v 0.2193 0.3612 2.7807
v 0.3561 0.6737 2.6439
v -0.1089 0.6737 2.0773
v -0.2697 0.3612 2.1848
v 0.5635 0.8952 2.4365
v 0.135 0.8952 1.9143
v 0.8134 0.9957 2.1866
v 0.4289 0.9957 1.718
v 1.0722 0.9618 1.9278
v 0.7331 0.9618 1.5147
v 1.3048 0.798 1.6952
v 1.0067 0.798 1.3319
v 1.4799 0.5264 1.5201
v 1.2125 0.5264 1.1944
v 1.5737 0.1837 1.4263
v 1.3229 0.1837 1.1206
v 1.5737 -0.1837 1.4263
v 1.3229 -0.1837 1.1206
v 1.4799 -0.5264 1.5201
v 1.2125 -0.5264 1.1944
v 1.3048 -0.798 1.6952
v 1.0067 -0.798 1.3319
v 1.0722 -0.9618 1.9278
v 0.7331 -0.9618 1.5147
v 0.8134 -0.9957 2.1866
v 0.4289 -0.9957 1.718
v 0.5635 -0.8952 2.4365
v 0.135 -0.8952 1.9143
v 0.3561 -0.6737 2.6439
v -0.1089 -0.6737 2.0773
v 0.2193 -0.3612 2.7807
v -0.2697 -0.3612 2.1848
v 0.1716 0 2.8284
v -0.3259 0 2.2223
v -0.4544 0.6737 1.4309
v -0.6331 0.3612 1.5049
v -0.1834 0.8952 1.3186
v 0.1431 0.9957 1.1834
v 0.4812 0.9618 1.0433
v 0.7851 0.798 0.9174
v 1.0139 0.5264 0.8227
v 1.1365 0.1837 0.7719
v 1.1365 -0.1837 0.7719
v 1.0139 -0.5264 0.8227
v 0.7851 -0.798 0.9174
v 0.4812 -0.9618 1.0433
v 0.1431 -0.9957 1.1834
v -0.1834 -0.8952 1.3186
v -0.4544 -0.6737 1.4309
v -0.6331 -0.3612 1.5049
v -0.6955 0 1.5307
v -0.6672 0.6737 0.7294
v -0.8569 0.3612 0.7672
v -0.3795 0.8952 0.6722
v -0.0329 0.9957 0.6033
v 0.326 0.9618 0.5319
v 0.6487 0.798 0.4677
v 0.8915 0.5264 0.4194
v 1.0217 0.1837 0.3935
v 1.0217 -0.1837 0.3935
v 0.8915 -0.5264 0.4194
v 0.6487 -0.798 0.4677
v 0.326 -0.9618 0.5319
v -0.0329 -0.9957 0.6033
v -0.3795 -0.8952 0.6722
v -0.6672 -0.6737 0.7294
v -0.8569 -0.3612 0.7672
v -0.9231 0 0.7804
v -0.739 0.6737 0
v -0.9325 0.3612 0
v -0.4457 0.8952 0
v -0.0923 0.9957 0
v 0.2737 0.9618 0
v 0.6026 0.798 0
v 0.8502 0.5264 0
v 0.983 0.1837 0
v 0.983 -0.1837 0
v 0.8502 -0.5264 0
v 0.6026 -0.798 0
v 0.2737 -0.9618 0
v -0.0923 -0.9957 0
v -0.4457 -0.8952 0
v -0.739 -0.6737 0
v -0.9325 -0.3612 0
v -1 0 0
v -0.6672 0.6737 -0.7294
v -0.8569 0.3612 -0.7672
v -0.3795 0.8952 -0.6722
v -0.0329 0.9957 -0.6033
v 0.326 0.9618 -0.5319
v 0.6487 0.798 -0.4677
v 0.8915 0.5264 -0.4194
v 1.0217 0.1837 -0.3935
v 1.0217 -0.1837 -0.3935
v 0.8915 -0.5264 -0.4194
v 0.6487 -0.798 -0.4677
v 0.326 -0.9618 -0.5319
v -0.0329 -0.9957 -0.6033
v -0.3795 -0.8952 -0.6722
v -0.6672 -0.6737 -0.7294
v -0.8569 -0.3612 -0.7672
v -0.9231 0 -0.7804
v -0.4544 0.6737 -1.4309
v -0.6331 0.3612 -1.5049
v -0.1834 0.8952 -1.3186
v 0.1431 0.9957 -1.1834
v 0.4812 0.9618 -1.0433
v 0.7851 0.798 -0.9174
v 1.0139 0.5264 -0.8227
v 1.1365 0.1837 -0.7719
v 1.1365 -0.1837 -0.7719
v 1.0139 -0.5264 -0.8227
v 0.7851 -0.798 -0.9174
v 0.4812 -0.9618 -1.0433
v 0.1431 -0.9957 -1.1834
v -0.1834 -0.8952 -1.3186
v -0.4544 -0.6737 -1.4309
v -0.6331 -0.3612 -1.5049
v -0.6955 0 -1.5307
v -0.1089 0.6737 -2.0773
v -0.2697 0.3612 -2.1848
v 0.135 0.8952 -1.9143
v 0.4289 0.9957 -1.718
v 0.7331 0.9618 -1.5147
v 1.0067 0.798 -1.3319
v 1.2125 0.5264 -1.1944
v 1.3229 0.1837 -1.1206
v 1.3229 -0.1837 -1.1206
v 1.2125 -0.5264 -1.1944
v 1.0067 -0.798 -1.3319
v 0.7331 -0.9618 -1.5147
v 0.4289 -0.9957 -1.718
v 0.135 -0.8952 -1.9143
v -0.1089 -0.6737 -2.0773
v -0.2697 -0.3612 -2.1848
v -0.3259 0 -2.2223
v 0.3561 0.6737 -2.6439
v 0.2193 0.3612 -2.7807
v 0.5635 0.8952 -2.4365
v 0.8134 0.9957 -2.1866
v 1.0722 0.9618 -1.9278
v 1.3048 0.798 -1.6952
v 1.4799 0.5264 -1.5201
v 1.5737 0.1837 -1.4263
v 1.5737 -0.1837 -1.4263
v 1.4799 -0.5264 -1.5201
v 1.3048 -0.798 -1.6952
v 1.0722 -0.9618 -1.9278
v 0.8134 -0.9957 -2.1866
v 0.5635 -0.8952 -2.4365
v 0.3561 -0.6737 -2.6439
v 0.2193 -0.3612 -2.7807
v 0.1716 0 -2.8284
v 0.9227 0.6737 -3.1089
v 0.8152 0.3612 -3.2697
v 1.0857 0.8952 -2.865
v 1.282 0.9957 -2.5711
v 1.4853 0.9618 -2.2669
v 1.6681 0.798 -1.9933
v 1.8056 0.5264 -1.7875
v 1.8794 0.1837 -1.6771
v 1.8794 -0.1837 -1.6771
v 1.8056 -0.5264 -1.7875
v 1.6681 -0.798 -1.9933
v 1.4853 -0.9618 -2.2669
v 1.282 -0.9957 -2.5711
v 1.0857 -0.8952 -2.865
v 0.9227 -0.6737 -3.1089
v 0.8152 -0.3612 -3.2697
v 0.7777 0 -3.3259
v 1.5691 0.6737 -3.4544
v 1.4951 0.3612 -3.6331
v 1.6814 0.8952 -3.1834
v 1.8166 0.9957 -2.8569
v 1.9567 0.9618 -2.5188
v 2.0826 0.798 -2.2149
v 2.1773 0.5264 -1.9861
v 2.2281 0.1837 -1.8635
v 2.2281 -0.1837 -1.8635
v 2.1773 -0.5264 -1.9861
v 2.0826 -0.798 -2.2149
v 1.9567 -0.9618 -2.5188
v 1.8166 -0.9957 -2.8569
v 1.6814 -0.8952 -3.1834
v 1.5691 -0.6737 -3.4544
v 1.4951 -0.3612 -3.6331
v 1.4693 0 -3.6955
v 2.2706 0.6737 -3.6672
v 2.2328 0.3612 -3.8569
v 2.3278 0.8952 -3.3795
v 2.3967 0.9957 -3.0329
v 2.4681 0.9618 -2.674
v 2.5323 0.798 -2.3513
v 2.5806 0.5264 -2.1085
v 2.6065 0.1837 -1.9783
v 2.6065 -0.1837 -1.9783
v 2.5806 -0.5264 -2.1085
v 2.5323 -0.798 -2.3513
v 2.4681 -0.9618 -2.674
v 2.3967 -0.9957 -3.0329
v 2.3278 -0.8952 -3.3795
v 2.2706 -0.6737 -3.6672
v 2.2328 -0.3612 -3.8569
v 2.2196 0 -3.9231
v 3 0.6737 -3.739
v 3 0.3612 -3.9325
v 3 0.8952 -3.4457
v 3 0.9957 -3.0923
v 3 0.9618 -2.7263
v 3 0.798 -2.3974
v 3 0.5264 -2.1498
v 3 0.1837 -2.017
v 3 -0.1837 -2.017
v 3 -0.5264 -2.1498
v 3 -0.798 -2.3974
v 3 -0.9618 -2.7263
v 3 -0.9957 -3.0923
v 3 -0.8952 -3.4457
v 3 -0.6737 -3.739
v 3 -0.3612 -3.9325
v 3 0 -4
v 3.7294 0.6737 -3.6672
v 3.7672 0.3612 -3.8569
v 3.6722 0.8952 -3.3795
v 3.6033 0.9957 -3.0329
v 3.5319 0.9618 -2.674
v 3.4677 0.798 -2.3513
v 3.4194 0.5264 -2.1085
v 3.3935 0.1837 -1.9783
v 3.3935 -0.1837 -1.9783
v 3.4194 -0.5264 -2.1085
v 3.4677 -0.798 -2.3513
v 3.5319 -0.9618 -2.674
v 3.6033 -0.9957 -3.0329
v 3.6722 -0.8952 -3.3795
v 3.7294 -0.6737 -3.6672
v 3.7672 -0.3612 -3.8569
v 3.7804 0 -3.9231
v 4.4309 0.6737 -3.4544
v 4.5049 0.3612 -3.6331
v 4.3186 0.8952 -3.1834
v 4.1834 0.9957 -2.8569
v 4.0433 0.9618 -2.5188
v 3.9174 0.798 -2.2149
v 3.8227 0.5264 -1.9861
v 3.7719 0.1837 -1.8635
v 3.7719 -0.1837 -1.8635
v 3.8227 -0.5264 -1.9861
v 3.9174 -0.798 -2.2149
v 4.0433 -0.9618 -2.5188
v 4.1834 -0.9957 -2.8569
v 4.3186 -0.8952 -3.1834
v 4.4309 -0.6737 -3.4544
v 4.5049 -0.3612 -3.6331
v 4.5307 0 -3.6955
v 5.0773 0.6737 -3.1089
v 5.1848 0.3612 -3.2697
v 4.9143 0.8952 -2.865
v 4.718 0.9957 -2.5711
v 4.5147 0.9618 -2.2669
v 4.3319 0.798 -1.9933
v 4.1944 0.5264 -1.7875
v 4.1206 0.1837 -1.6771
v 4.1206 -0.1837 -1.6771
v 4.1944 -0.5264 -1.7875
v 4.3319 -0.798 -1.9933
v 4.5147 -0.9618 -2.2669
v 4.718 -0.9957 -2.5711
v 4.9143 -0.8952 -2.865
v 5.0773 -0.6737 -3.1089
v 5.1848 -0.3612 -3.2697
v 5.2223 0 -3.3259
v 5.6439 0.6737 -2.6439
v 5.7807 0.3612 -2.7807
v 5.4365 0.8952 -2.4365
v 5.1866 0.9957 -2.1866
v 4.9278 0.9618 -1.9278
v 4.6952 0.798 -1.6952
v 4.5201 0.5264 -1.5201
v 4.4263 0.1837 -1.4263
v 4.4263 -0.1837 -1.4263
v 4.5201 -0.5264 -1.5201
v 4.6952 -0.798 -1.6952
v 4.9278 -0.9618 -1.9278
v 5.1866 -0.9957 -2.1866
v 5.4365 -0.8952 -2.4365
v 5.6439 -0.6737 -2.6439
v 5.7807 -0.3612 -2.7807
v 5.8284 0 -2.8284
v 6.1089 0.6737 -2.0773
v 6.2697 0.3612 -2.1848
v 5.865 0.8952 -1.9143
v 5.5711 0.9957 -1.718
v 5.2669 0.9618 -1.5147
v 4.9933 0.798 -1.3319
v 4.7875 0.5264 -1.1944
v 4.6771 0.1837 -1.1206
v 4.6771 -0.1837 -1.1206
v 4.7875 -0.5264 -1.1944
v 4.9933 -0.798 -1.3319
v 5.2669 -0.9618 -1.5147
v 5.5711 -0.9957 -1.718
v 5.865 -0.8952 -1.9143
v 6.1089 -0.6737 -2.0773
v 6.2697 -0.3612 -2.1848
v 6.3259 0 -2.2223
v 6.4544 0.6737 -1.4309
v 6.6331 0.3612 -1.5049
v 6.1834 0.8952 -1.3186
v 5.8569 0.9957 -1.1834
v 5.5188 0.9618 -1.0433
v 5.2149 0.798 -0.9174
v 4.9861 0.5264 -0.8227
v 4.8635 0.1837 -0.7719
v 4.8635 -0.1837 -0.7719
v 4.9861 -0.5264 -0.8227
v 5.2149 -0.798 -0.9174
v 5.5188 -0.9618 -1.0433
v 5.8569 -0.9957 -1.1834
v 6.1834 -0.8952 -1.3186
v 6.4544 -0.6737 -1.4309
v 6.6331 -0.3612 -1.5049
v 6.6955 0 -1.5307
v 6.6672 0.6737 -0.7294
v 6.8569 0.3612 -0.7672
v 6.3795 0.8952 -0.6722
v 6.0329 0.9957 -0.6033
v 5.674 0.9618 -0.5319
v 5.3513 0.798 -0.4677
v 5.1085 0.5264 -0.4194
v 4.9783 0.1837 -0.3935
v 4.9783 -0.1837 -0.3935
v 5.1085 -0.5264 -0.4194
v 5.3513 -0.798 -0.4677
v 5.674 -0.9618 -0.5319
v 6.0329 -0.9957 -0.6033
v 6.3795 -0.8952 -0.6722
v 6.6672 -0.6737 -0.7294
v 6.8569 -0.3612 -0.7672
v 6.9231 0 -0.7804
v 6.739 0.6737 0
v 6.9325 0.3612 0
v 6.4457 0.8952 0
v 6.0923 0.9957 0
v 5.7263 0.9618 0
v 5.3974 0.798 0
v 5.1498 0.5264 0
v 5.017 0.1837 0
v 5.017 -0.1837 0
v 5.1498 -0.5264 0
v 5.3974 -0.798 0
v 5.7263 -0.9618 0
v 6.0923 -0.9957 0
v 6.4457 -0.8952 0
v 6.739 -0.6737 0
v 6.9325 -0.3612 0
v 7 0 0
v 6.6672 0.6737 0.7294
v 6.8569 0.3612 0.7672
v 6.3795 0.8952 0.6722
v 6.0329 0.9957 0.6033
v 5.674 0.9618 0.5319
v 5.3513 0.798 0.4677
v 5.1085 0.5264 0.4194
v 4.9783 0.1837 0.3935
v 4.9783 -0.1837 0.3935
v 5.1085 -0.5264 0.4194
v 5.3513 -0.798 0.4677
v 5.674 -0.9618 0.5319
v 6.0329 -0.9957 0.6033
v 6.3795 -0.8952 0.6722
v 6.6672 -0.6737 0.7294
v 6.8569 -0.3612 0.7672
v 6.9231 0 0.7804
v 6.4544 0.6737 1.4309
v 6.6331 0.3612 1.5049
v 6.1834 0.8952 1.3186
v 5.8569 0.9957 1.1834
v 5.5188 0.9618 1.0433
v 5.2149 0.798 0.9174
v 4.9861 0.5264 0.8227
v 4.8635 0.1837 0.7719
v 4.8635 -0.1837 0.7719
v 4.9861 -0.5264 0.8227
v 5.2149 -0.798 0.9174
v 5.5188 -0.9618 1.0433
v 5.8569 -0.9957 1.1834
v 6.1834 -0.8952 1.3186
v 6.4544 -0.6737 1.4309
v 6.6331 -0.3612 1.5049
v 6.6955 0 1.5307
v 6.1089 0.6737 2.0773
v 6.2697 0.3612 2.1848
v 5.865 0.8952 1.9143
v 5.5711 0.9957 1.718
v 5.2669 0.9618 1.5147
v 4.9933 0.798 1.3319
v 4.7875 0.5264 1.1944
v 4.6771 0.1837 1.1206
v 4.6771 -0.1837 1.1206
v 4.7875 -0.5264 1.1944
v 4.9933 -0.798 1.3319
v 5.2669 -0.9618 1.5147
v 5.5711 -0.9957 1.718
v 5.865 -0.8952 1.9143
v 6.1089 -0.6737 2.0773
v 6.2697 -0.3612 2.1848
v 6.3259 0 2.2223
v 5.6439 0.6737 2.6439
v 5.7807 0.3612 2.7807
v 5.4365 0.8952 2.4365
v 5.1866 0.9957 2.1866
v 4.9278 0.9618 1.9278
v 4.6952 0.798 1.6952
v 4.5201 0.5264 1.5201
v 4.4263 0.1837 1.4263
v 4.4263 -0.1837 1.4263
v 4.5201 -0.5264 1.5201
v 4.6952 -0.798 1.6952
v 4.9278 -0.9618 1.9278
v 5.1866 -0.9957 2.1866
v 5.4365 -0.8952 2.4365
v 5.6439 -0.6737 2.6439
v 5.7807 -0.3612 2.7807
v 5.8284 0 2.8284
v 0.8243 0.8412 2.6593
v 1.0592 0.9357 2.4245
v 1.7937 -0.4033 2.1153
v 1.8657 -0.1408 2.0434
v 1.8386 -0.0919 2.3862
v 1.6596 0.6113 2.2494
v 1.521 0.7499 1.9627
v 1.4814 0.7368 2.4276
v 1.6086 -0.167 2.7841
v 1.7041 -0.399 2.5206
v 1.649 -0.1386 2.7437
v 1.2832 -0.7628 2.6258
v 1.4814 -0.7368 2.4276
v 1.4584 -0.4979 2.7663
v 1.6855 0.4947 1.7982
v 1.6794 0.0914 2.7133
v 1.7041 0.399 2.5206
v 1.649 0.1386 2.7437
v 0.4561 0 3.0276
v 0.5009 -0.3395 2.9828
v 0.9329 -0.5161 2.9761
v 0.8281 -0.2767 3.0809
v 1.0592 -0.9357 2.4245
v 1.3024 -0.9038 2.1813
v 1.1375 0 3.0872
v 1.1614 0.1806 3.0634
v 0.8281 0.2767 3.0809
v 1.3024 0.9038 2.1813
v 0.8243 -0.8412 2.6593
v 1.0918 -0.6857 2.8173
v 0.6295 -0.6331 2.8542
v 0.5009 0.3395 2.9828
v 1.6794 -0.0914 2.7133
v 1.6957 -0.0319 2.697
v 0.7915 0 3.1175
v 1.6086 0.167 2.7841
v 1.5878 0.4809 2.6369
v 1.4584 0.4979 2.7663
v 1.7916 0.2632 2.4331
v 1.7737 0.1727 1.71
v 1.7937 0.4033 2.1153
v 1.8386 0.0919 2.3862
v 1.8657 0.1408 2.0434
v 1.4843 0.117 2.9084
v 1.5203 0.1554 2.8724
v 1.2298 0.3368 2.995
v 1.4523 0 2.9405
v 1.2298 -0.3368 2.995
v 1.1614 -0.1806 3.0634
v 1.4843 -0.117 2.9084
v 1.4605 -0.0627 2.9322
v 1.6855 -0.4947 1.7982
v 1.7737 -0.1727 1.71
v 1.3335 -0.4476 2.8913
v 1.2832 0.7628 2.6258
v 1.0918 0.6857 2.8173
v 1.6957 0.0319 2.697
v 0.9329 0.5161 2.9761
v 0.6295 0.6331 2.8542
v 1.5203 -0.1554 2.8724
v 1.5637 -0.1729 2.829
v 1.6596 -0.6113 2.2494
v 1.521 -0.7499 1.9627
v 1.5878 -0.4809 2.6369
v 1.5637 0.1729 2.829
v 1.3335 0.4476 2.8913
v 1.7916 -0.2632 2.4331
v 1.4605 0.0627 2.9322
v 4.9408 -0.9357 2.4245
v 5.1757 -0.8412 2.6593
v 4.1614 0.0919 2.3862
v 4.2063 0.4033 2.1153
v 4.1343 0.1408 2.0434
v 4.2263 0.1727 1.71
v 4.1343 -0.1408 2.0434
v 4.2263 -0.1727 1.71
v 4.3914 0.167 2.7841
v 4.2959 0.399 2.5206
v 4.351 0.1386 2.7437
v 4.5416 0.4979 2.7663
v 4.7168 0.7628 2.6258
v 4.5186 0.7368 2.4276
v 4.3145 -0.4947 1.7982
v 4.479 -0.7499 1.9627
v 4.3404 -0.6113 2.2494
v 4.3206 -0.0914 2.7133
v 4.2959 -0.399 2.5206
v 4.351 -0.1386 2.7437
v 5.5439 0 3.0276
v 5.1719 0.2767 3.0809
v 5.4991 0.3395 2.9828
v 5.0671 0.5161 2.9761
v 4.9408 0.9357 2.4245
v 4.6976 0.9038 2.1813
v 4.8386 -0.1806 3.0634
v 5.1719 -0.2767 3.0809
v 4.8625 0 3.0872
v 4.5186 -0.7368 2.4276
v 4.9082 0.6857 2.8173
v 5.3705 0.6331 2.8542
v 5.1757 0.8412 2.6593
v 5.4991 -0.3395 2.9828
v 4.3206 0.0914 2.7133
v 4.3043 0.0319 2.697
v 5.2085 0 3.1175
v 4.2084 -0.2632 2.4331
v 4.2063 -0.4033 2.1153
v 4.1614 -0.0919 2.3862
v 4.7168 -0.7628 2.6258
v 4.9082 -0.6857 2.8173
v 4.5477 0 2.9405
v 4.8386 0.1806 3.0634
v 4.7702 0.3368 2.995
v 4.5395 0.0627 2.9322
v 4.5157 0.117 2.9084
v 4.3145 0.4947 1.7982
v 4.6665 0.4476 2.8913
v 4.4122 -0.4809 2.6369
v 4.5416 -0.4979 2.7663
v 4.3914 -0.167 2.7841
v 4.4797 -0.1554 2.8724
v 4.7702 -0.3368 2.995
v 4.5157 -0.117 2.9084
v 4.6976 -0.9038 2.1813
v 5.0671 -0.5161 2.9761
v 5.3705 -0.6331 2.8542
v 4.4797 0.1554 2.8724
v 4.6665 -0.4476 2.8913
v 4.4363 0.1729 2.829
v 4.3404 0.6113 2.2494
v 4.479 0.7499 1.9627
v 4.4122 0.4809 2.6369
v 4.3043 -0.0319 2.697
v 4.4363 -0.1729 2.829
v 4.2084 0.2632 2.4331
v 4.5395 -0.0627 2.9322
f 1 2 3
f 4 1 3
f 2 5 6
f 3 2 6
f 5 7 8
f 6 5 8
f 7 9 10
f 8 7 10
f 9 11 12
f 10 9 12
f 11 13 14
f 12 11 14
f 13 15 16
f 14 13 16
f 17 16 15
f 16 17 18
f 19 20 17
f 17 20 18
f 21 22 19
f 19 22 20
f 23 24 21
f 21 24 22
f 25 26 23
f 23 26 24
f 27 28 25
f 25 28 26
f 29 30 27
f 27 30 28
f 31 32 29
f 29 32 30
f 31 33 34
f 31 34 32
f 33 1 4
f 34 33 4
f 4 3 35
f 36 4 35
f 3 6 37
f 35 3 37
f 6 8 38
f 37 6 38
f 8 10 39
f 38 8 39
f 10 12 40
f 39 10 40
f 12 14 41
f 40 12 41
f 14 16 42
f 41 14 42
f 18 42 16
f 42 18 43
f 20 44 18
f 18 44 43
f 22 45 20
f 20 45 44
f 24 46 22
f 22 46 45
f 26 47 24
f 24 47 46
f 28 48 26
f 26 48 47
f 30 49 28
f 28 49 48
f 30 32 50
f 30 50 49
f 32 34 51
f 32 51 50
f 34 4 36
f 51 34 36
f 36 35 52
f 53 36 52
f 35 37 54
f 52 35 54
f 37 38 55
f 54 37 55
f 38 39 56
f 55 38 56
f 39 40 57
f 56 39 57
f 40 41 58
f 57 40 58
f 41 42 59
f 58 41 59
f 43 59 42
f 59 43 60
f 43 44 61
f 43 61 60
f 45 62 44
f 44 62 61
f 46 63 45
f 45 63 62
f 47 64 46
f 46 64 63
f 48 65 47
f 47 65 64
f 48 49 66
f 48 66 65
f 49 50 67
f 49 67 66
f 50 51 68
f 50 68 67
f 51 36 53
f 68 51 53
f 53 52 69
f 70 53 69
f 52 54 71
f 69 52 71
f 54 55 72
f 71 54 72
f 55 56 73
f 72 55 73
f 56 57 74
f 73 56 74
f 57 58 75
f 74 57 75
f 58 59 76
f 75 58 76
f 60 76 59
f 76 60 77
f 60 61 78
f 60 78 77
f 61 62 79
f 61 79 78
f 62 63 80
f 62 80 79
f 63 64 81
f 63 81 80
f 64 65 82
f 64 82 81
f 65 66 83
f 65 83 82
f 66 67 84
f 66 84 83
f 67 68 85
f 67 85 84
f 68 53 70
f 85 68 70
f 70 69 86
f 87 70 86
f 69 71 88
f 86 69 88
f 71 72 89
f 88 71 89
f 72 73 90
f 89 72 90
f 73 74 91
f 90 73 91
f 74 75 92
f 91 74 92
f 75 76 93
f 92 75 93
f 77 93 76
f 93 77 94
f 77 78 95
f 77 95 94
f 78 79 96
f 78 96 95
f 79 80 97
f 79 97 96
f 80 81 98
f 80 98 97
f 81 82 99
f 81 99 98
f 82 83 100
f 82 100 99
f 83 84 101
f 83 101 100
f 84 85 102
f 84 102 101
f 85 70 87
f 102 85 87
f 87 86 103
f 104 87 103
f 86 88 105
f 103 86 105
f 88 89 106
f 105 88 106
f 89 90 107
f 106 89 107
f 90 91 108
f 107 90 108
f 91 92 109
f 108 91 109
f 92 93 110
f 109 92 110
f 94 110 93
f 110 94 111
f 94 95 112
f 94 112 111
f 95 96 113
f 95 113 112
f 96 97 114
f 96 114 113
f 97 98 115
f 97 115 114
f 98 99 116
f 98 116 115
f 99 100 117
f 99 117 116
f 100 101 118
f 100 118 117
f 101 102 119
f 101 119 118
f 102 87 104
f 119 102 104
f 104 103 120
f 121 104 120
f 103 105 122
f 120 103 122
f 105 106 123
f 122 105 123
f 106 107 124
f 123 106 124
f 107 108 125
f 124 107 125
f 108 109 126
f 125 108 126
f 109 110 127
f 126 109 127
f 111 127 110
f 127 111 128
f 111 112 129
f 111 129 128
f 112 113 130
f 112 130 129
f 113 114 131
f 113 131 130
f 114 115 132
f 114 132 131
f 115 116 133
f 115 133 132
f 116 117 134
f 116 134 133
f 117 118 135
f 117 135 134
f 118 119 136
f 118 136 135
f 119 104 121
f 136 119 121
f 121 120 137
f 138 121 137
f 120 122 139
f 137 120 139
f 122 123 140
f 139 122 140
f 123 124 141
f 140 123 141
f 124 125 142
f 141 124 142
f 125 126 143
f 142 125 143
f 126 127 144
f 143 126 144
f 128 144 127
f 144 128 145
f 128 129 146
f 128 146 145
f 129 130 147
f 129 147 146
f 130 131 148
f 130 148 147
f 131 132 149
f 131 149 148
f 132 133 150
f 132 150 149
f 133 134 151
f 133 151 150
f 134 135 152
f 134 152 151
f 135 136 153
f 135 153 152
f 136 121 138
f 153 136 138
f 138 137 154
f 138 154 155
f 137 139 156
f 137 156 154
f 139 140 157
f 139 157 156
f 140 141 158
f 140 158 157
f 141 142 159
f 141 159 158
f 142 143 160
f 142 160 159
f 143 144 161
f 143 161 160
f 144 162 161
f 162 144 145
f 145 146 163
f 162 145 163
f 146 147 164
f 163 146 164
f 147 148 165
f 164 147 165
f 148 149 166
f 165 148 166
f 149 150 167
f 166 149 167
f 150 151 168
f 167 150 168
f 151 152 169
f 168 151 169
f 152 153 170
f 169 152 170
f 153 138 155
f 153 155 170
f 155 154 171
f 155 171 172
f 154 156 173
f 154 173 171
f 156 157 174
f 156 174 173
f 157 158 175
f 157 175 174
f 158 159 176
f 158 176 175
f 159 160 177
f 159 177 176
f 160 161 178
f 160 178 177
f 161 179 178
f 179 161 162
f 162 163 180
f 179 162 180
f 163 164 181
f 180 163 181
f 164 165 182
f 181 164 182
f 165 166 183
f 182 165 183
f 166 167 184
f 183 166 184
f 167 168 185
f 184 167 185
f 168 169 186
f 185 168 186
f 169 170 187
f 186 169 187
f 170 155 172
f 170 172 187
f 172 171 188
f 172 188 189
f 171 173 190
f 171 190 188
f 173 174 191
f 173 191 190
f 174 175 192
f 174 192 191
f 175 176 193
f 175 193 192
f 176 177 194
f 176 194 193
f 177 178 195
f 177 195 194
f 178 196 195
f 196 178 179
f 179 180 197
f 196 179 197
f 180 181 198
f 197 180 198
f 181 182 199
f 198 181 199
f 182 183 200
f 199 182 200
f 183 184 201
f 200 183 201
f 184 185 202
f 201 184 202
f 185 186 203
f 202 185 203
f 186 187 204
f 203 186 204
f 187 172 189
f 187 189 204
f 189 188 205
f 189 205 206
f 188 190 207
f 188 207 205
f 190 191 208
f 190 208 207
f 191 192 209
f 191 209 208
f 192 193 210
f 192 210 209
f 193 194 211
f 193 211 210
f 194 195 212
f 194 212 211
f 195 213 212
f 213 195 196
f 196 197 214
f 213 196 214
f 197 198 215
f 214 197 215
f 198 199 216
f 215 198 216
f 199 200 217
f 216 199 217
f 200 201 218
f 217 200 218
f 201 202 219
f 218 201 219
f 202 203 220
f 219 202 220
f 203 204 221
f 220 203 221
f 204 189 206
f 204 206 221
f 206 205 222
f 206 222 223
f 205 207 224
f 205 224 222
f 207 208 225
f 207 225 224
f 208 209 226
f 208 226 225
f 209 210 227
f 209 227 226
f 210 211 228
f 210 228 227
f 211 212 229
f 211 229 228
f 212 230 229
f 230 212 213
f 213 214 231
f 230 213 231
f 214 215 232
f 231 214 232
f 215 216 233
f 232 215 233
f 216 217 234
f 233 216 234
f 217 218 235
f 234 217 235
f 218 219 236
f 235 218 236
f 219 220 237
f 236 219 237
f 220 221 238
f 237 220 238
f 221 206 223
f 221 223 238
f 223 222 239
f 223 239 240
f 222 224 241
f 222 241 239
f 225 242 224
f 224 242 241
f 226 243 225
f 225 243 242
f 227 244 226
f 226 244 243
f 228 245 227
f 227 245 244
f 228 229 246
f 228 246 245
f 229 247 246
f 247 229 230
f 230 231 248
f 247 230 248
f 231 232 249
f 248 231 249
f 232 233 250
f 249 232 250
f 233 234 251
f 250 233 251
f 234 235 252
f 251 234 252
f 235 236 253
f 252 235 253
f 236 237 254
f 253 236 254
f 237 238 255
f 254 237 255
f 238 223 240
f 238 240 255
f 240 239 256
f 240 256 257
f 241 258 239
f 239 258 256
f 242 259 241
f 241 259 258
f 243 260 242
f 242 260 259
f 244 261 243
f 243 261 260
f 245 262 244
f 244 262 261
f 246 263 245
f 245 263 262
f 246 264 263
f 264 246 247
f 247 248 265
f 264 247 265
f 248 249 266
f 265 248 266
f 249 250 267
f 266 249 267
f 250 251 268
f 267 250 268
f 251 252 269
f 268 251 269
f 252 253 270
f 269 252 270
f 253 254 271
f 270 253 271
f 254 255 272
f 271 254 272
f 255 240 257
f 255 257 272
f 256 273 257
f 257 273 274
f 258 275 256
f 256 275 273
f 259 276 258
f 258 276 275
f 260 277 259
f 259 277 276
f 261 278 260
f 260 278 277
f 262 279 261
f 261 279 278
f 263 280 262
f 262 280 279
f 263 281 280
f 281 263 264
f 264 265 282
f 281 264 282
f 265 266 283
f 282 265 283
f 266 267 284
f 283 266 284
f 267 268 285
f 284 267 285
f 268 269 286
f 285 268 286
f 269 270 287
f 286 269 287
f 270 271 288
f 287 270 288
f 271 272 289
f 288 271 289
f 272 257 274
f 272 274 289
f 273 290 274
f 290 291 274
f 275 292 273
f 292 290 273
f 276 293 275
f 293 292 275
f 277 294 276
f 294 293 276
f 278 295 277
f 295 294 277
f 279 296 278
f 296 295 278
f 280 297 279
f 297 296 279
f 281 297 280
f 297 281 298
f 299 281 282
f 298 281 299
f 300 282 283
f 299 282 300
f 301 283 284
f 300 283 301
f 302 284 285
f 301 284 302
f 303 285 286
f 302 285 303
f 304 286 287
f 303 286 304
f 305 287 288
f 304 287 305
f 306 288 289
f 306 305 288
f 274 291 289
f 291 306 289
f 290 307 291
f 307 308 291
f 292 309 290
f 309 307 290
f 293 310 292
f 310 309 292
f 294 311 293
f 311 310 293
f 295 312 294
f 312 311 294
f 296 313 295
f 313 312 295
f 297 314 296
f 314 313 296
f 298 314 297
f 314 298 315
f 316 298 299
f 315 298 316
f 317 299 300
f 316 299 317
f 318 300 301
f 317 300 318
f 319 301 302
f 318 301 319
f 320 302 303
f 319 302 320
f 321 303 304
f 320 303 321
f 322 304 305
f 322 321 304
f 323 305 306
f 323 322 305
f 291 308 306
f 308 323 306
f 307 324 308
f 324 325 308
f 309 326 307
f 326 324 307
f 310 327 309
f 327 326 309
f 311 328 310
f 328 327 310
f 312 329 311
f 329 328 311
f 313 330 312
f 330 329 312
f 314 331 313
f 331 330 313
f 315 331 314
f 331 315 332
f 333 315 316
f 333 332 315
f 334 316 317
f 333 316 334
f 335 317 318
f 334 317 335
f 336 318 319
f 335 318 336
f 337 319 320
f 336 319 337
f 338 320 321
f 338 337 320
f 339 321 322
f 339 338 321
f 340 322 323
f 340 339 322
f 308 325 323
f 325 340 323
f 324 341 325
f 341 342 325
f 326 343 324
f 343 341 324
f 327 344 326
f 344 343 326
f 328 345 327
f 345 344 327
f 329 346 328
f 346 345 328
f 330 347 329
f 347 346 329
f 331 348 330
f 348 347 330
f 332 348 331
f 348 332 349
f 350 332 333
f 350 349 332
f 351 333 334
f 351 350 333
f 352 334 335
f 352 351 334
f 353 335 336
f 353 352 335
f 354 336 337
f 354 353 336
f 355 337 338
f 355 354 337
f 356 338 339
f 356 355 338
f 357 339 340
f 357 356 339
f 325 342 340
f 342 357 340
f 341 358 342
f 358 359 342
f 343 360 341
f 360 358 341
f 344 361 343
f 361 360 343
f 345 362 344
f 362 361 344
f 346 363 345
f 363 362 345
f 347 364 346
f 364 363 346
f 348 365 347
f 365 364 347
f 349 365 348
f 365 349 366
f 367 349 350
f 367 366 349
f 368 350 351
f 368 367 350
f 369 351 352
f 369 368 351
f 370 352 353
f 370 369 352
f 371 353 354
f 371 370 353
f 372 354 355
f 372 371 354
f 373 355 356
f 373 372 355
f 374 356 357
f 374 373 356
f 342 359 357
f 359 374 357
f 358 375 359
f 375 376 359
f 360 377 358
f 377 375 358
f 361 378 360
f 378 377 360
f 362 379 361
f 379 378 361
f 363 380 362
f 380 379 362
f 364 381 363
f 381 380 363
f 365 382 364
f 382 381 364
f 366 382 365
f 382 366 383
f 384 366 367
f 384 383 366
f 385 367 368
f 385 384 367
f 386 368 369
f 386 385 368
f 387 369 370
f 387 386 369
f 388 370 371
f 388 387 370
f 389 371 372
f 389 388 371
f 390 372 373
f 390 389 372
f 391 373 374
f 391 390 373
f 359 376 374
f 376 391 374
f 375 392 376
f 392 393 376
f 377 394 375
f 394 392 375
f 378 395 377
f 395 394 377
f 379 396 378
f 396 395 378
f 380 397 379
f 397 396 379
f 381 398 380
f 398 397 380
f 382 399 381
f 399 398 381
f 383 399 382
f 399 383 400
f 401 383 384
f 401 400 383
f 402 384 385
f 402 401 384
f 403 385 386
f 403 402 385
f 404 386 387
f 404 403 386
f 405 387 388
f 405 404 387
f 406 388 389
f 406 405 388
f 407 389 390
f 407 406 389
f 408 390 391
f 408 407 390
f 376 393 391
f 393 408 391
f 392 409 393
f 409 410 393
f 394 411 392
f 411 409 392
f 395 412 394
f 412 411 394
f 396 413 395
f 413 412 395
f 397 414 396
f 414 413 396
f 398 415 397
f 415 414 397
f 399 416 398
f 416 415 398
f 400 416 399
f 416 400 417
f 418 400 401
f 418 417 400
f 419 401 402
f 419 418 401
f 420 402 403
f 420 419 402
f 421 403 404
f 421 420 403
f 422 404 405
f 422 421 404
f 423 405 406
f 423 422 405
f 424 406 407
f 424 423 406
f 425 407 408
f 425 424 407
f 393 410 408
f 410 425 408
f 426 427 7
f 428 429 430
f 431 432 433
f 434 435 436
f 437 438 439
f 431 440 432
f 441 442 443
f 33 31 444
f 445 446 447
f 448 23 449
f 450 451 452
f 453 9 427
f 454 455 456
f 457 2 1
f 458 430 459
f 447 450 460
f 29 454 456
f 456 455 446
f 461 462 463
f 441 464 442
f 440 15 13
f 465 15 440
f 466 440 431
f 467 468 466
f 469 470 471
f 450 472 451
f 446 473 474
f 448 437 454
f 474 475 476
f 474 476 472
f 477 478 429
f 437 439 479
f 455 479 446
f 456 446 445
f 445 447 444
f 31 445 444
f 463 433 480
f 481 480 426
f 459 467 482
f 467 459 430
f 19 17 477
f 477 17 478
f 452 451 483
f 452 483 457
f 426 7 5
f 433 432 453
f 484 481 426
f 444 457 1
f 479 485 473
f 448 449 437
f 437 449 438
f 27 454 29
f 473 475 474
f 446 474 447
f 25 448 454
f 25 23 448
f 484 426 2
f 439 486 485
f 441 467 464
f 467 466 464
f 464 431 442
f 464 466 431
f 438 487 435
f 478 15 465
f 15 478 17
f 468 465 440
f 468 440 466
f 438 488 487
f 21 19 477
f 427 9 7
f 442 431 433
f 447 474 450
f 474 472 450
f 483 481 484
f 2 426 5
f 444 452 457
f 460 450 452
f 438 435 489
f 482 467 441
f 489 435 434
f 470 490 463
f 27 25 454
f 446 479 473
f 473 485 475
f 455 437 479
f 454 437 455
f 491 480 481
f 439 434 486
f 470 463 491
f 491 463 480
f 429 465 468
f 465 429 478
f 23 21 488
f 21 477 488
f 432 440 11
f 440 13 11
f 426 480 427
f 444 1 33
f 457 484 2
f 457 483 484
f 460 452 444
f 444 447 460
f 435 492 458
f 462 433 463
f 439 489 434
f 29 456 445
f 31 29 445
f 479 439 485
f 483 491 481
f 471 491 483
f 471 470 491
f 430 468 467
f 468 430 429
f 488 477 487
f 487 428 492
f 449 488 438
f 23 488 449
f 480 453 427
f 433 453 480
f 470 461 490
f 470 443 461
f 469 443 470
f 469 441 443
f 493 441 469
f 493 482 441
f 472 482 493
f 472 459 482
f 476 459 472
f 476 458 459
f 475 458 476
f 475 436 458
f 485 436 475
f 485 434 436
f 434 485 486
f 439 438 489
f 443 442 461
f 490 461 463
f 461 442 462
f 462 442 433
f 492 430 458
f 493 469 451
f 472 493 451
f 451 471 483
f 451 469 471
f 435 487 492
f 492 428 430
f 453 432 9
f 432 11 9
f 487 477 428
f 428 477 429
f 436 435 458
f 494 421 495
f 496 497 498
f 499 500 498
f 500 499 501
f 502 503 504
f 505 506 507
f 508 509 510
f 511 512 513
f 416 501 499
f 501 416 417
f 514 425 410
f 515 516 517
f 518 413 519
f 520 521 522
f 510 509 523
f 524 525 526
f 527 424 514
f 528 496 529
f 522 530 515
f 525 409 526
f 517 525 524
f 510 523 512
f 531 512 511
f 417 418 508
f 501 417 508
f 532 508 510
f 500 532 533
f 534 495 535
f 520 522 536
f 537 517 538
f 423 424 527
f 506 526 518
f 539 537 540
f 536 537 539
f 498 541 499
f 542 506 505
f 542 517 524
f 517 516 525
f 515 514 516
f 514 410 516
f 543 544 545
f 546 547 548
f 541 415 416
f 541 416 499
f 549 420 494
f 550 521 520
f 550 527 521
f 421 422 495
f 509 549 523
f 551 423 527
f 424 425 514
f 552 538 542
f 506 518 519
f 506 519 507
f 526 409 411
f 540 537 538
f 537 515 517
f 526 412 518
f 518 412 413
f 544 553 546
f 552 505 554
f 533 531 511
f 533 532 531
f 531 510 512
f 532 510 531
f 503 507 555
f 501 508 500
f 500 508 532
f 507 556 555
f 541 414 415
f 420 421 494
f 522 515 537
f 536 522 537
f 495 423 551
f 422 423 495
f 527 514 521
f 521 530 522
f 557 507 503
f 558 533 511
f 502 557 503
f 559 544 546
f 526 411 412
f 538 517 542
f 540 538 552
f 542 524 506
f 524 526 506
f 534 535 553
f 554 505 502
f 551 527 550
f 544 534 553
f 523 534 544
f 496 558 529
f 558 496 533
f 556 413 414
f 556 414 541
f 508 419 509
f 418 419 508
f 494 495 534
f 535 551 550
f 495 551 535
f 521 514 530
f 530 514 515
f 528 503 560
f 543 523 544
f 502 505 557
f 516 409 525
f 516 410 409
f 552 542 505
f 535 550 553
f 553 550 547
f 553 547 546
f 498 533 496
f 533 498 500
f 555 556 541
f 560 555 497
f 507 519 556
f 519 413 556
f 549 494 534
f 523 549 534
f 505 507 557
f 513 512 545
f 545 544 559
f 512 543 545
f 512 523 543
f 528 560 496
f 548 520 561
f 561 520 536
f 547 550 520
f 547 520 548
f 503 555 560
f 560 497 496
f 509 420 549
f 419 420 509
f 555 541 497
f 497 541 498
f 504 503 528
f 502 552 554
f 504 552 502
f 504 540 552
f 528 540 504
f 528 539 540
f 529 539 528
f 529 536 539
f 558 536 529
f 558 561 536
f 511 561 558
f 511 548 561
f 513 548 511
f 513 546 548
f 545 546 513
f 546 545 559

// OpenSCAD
translate([3, 0, 0])
rotate([0, -90, 90])
rotate([0, 0, 45])
union()
{
    rotate_extrude(angle = 270, $fn=32)
    translate([3, 0, 0])
    circle(r = 1, $fn=17);

    translate([3, 0, 0])
    rotate([90, 0, 0])
    sphere(r = 1, $fn=17);

    translate([0, -3, 0])
    rotate([270, 0, 0])
    rotate([0, 90, 0])
    sphere(r = 1, $fn=17);
}
